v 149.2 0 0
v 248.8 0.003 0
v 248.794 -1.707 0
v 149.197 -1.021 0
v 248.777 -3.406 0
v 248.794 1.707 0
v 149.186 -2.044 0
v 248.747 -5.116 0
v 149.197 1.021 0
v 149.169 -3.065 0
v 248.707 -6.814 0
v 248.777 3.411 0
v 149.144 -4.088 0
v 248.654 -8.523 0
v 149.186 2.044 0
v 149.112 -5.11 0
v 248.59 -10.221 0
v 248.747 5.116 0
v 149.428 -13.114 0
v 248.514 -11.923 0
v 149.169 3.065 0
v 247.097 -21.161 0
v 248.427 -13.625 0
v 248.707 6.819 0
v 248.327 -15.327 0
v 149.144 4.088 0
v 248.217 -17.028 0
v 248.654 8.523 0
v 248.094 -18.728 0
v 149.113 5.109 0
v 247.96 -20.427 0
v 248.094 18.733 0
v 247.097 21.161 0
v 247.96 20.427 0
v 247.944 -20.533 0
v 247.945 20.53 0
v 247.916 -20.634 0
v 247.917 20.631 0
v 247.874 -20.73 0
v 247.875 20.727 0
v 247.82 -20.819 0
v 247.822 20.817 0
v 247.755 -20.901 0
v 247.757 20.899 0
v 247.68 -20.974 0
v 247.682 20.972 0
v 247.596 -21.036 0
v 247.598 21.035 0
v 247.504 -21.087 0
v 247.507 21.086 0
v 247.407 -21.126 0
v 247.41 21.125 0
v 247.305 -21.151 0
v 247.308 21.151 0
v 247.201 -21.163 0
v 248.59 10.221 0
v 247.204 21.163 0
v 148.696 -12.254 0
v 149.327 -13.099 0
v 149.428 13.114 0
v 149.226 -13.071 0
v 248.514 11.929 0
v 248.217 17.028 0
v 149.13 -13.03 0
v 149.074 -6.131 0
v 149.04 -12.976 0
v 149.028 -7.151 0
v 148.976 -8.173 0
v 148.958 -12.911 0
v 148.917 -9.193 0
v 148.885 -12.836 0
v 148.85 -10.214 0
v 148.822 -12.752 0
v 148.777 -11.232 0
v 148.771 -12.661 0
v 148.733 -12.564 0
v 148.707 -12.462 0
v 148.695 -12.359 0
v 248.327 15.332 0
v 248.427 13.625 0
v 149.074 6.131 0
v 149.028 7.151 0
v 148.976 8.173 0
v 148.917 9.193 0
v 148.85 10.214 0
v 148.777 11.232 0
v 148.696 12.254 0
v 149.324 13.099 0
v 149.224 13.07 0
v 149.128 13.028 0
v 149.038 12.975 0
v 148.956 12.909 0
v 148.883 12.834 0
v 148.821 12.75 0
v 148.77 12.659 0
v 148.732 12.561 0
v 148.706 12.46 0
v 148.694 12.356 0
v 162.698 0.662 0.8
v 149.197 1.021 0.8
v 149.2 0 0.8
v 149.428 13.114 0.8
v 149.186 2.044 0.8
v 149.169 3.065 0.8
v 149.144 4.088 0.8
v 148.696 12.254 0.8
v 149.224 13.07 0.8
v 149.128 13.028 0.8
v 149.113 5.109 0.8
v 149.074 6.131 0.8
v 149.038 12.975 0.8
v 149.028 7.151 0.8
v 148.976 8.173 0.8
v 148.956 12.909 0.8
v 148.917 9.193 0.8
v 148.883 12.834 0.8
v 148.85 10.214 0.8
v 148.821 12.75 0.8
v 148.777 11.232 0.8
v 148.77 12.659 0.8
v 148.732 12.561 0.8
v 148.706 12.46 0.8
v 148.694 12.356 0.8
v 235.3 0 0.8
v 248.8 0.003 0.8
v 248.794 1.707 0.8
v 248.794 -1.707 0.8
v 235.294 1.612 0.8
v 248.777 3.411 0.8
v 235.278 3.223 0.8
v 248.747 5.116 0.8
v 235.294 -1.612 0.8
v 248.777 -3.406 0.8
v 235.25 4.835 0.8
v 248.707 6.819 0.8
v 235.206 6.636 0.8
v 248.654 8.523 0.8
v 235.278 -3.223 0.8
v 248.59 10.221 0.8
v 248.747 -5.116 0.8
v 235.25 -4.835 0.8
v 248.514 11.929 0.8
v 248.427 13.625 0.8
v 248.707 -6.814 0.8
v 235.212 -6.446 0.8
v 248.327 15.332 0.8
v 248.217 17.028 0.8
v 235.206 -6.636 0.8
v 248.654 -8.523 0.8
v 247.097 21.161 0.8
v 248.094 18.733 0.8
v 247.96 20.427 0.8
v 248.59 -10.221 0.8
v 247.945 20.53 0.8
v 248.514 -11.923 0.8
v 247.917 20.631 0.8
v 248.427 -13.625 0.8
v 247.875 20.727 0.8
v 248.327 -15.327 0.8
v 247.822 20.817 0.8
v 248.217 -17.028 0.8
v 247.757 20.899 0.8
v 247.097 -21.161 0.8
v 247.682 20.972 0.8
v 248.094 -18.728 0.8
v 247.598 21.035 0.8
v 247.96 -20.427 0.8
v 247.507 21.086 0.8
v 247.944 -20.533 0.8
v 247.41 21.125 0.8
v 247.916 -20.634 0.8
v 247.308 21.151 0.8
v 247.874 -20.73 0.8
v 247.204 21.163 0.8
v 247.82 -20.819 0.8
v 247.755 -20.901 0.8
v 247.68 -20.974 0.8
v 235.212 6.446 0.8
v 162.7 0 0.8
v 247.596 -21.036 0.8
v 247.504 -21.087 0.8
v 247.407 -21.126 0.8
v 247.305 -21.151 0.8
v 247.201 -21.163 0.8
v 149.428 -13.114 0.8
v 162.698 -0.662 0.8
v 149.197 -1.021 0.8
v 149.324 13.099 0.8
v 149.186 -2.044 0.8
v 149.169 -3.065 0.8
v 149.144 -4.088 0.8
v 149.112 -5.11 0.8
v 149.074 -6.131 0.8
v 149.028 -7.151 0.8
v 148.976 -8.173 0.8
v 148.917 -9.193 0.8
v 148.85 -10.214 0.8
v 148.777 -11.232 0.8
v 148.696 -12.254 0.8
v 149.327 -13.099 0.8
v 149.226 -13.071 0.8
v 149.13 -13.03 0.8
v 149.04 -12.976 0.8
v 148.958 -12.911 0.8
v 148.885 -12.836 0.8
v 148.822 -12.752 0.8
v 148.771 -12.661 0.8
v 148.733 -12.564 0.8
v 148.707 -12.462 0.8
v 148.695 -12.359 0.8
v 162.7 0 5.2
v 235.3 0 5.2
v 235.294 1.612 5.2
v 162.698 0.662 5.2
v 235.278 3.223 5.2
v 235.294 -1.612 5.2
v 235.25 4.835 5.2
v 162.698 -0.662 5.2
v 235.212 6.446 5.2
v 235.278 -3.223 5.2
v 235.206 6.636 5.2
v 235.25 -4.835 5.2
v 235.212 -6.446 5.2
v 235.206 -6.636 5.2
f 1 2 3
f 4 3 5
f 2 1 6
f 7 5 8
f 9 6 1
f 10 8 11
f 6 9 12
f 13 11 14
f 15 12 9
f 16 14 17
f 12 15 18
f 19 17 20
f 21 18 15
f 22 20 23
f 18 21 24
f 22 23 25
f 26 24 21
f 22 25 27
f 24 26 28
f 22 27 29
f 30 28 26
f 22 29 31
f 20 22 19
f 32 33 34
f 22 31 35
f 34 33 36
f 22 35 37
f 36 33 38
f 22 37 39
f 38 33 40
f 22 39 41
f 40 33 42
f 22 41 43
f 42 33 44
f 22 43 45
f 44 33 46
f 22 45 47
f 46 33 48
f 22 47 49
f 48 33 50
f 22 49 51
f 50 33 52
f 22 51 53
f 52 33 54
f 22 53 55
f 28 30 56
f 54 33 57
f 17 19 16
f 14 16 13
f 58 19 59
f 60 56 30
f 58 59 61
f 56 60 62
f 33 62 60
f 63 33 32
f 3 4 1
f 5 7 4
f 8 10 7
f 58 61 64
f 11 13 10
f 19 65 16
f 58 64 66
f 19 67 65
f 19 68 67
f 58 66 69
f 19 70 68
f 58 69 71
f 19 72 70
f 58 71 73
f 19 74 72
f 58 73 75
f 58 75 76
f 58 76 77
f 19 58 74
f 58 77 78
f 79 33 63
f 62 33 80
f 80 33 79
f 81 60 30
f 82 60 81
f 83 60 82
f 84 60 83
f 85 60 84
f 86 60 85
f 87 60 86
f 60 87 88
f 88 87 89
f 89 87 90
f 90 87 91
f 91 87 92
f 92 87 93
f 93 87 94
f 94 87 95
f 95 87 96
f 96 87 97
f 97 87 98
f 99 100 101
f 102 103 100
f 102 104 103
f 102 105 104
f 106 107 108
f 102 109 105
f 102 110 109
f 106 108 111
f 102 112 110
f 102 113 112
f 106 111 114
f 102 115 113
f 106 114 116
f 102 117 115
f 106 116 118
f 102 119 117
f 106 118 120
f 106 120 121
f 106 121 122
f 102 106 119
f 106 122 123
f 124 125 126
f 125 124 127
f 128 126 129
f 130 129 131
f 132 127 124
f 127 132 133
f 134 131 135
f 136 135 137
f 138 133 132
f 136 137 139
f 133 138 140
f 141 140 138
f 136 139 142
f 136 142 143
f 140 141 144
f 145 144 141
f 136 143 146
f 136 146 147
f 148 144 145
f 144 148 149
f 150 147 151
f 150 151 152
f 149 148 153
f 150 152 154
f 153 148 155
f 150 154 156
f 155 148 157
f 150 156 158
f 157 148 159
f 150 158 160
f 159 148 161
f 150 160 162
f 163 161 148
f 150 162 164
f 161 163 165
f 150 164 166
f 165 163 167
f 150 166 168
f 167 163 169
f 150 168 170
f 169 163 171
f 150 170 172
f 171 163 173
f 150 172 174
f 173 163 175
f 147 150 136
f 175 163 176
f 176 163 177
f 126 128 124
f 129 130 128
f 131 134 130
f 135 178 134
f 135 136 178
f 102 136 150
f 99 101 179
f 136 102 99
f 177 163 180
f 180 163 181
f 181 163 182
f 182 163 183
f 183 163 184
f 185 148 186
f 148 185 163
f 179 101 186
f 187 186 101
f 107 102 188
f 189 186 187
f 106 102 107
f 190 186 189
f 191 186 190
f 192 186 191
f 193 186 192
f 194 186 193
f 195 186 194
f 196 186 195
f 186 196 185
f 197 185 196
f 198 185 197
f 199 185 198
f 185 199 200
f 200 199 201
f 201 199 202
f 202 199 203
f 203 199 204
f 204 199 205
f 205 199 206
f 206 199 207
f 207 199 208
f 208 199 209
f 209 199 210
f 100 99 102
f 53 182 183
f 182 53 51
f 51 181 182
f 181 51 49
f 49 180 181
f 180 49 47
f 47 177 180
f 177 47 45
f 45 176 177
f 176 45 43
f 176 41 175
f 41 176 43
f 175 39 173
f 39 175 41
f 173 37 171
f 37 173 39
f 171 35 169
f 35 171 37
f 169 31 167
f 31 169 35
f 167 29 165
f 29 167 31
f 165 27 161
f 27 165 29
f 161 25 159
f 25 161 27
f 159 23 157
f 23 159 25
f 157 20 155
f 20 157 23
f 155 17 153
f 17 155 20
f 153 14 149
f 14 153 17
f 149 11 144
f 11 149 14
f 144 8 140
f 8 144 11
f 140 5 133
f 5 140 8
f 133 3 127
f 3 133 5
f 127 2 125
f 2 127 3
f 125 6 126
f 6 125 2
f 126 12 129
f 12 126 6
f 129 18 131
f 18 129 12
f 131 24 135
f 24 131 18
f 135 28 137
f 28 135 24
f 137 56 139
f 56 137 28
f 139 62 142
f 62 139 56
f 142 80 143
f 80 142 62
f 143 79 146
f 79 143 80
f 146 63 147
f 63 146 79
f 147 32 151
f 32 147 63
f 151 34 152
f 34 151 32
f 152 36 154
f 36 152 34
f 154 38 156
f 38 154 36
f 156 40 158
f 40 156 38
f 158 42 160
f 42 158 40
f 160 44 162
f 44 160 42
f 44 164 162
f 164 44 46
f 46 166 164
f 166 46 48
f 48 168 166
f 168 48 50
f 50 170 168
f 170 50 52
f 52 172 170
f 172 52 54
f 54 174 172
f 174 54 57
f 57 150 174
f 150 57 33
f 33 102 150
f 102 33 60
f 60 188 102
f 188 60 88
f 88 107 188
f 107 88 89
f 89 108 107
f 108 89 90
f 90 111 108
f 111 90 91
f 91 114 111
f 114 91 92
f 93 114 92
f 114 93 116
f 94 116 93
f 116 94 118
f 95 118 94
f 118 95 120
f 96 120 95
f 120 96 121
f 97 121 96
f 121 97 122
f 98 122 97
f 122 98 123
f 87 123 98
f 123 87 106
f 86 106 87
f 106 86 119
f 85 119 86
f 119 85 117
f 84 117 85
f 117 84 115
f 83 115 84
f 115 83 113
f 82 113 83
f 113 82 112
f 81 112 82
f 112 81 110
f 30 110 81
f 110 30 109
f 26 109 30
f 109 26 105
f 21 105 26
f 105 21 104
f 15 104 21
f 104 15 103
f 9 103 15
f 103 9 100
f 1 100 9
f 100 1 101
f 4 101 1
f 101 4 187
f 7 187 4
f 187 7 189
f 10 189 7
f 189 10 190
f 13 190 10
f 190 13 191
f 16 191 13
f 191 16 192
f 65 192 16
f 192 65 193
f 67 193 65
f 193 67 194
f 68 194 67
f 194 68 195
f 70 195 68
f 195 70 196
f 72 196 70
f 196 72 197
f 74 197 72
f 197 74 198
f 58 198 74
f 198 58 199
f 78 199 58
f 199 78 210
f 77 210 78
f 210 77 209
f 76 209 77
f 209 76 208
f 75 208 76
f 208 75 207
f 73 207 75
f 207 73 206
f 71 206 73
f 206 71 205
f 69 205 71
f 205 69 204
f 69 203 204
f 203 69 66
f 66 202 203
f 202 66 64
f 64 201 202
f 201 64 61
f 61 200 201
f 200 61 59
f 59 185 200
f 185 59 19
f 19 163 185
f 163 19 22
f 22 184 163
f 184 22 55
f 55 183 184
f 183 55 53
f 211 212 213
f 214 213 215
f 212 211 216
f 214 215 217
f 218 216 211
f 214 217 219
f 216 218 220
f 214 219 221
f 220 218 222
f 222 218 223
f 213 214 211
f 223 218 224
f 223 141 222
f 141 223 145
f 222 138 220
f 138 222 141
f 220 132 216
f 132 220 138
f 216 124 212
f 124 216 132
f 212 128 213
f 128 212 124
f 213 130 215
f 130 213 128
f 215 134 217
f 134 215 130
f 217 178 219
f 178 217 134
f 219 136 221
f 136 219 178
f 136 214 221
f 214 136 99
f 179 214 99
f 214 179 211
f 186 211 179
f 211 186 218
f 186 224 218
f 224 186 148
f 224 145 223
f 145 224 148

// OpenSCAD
// Gen-DW — bobbin BASE (bottom flange + hub). Print x12, flange down. Wind 24 AWG x 152 t around
// the hub with the LID glued on (coil_lid.stl). Copper lives ONLY between the flanges (no proud winds).
include <parameters.scad>;
$fn = 48;
module sector_2d(r_in, r_out, ang) {
    polygon([
        for (a = [-ang/2 : ang/24 : ang/2]) [r_in*cos(a), r_in*sin(a)],
        for (a = [ang/2 : -ang/24 : -ang/2]) [r_out*cos(a), r_out*sin(a)]
    ]);
}
module footprint_2d() { offset(r=wall) sector_2d(coil_id_r, coil_od_r, span_deg); }
module hub_2d()       { offset(delta=-coil_core_inset) sector_2d(coil_id_r, coil_od_r, span_deg); }

union() {
    linear_extrude(flange_t) footprint_2d();
    translate([0, 0, flange_t - 0.01]) linear_extrude(former_web + 0.01) hub_2d();
}
